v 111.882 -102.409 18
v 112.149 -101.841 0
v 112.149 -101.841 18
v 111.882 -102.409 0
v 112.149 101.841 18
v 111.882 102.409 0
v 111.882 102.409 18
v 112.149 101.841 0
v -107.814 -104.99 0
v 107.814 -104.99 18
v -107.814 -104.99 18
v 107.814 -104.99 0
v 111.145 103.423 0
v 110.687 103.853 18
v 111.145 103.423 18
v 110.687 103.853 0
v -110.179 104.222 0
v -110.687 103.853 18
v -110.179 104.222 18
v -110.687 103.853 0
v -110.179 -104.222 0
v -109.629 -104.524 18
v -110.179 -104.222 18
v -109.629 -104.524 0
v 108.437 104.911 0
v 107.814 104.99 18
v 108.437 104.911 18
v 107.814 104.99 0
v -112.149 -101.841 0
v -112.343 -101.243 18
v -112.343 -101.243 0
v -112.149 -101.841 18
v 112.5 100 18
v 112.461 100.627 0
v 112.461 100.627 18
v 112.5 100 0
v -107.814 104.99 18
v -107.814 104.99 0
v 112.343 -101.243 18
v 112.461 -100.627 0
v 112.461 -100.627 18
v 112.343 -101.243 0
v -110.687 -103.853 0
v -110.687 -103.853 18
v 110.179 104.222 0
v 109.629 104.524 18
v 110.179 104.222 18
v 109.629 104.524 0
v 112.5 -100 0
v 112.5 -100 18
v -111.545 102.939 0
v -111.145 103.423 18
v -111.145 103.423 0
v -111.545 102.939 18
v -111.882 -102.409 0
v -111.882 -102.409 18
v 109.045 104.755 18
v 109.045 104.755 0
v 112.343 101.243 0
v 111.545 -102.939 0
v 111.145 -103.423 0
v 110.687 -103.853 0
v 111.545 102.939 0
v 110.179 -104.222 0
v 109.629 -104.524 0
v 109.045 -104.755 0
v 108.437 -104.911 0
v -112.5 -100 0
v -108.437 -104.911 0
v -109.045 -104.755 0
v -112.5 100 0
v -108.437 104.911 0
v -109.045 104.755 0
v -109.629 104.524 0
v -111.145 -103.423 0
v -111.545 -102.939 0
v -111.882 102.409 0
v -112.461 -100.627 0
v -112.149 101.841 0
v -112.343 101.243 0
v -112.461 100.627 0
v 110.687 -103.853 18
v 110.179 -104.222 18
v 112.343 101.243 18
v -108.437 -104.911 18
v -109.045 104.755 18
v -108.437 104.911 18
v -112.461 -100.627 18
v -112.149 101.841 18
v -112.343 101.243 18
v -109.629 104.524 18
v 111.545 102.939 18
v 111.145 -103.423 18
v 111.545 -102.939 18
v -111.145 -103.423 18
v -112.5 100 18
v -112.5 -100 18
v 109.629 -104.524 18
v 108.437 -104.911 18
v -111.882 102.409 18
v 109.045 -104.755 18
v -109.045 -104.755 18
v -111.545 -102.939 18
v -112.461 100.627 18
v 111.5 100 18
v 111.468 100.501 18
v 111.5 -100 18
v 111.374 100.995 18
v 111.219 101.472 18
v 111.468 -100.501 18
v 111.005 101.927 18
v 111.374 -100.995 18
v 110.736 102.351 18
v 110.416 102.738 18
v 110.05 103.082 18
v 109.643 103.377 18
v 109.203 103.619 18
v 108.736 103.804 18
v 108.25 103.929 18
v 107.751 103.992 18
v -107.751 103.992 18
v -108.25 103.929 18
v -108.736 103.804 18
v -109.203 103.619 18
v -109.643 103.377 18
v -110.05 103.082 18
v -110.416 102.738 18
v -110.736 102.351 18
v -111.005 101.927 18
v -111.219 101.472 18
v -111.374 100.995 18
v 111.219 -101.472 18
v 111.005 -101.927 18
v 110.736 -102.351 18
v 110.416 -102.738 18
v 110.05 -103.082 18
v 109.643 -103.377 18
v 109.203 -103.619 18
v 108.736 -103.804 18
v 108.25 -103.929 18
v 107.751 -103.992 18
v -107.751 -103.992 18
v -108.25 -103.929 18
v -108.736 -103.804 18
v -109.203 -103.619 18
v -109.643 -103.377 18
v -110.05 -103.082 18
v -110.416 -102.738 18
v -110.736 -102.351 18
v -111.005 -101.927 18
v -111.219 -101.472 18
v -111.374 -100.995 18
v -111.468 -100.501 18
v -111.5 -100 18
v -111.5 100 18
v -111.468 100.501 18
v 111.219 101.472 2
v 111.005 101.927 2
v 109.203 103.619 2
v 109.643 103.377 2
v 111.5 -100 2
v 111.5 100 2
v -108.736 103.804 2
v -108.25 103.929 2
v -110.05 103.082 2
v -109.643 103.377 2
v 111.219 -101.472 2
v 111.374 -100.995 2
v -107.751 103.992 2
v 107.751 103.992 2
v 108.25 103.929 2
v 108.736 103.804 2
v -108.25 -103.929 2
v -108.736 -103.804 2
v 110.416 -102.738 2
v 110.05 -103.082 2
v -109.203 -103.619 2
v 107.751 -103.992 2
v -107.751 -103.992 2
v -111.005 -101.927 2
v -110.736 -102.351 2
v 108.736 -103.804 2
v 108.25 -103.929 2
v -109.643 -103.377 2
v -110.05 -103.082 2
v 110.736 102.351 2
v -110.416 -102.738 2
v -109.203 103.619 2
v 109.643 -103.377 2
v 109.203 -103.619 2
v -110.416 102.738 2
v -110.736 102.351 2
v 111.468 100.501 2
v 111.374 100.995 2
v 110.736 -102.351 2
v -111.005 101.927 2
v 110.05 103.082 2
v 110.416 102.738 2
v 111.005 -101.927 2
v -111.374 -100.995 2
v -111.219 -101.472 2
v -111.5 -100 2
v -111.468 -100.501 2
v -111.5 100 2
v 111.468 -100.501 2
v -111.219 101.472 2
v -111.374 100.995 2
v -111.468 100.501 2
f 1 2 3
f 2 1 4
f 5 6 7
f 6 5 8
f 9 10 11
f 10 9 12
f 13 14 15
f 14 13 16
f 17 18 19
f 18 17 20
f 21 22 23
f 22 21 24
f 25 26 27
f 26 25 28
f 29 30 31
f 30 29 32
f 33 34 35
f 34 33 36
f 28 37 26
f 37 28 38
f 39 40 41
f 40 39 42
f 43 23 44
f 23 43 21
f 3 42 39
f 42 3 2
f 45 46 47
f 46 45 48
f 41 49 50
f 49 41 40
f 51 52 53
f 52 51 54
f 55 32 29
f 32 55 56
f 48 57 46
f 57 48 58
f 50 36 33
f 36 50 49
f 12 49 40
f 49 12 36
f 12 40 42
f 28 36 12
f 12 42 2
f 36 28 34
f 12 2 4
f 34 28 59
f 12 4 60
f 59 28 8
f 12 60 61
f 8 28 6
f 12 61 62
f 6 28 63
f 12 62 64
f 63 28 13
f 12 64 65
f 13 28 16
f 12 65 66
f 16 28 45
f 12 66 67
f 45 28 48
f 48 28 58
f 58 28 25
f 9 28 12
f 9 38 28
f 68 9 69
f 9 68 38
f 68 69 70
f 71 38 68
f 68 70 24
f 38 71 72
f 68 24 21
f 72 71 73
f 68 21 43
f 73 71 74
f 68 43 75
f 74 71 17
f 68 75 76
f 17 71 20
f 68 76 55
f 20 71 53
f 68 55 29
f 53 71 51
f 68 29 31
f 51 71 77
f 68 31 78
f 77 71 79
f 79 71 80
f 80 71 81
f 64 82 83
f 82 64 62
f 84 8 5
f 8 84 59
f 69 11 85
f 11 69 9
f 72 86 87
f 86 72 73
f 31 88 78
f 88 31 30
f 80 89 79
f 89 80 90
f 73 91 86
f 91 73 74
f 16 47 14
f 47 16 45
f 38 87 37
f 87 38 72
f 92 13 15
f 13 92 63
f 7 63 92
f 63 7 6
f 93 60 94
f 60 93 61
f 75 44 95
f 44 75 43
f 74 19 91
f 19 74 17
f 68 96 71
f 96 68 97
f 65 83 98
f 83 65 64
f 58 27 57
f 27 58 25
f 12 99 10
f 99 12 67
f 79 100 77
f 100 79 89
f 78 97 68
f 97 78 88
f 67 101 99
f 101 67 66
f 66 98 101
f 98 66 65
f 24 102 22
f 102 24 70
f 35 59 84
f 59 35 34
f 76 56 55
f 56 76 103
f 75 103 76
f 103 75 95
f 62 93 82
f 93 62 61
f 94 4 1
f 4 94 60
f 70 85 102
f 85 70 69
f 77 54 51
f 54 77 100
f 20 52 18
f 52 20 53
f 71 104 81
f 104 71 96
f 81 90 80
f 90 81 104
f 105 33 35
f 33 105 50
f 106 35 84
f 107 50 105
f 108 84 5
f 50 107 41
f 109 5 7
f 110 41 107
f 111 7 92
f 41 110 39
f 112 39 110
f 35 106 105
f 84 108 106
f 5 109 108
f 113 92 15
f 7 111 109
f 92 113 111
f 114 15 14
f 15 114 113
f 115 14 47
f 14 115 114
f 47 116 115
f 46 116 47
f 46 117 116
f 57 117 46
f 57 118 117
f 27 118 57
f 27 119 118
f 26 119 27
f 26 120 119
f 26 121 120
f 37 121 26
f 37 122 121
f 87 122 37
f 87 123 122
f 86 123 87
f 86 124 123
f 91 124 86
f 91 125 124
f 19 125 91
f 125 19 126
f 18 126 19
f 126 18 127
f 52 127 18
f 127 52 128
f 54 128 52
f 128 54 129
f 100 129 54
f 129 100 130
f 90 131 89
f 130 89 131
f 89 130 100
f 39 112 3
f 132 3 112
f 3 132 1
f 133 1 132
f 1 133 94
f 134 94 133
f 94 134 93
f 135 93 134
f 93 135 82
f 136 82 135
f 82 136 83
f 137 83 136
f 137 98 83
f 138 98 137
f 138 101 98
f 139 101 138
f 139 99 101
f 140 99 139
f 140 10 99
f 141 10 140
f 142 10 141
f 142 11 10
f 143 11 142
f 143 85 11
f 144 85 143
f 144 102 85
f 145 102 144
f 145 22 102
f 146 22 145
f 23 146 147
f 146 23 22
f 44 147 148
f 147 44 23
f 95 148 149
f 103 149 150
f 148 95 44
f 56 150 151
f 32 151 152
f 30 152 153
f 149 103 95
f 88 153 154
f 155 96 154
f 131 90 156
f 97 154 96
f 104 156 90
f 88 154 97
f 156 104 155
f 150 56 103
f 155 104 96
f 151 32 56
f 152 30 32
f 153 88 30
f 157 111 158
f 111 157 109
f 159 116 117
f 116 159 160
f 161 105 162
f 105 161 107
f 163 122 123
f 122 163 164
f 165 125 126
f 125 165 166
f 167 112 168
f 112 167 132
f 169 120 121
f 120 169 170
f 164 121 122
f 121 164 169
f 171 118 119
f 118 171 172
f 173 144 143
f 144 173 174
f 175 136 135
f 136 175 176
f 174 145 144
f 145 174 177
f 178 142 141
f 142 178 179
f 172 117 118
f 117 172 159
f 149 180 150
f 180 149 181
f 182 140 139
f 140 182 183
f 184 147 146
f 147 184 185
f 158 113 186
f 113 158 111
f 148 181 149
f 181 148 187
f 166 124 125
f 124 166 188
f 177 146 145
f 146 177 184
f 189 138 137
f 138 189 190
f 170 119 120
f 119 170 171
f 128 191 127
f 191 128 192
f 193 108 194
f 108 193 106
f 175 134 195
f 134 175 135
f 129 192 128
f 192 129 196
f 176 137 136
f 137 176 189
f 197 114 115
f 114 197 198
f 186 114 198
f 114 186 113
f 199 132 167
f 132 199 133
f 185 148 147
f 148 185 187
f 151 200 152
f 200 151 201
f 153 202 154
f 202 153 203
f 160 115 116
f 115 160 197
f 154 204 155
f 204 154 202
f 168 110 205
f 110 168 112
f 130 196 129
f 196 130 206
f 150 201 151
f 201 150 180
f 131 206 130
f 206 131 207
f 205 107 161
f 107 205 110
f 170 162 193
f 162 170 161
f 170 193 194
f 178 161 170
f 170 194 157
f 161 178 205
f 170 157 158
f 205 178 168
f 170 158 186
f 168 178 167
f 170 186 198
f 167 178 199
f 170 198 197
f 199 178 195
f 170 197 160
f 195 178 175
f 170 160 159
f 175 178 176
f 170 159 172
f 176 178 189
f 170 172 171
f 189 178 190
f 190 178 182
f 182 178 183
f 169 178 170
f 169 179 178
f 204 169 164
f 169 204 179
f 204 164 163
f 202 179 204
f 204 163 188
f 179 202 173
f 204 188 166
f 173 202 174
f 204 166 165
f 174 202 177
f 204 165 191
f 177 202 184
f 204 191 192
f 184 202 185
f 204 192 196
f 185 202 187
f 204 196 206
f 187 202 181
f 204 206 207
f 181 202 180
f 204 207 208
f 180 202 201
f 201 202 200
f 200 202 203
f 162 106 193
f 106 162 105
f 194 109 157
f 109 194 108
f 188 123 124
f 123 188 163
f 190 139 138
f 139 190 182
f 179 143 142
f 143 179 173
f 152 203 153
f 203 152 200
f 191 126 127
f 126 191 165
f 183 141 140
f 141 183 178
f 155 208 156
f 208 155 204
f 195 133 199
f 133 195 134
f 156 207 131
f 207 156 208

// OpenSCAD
$fn = 50;


difference() {
	union() {
		hull() {
			translate(v = [-107.5000000000, 100.0000000000, 0]) {
				cylinder(h = 18, r = 5);
			}
			translate(v = [107.5000000000, 100.0000000000, 0]) {
				cylinder(h = 18, r = 5);
			}
			translate(v = [-107.5000000000, -100.0000000000, 0]) {
				cylinder(h = 18, r = 5);
			}
			translate(v = [107.5000000000, -100.0000000000, 0]) {
				cylinder(h = 18, r = 5);
			}
		}
	}
	union() {
		translate(v = [0, 0, 2]) {
			hull() {
				translate(v = [-107.5000000000, 100.0000000000, 0]) {
					cylinder(h = 16, r = 4);
				}
				translate(v = [107.5000000000, 100.0000000000, 0]) {
					cylinder(h = 16, r = 4);
				}
				translate(v = [-107.5000000000, -100.0000000000, 0]) {
					cylinder(h = 16, r = 4);
				}
				translate(v = [107.5000000000, -100.0000000000, 0]) {
					cylinder(h = 16, r = 4);
				}
			}
		}
	}
}
